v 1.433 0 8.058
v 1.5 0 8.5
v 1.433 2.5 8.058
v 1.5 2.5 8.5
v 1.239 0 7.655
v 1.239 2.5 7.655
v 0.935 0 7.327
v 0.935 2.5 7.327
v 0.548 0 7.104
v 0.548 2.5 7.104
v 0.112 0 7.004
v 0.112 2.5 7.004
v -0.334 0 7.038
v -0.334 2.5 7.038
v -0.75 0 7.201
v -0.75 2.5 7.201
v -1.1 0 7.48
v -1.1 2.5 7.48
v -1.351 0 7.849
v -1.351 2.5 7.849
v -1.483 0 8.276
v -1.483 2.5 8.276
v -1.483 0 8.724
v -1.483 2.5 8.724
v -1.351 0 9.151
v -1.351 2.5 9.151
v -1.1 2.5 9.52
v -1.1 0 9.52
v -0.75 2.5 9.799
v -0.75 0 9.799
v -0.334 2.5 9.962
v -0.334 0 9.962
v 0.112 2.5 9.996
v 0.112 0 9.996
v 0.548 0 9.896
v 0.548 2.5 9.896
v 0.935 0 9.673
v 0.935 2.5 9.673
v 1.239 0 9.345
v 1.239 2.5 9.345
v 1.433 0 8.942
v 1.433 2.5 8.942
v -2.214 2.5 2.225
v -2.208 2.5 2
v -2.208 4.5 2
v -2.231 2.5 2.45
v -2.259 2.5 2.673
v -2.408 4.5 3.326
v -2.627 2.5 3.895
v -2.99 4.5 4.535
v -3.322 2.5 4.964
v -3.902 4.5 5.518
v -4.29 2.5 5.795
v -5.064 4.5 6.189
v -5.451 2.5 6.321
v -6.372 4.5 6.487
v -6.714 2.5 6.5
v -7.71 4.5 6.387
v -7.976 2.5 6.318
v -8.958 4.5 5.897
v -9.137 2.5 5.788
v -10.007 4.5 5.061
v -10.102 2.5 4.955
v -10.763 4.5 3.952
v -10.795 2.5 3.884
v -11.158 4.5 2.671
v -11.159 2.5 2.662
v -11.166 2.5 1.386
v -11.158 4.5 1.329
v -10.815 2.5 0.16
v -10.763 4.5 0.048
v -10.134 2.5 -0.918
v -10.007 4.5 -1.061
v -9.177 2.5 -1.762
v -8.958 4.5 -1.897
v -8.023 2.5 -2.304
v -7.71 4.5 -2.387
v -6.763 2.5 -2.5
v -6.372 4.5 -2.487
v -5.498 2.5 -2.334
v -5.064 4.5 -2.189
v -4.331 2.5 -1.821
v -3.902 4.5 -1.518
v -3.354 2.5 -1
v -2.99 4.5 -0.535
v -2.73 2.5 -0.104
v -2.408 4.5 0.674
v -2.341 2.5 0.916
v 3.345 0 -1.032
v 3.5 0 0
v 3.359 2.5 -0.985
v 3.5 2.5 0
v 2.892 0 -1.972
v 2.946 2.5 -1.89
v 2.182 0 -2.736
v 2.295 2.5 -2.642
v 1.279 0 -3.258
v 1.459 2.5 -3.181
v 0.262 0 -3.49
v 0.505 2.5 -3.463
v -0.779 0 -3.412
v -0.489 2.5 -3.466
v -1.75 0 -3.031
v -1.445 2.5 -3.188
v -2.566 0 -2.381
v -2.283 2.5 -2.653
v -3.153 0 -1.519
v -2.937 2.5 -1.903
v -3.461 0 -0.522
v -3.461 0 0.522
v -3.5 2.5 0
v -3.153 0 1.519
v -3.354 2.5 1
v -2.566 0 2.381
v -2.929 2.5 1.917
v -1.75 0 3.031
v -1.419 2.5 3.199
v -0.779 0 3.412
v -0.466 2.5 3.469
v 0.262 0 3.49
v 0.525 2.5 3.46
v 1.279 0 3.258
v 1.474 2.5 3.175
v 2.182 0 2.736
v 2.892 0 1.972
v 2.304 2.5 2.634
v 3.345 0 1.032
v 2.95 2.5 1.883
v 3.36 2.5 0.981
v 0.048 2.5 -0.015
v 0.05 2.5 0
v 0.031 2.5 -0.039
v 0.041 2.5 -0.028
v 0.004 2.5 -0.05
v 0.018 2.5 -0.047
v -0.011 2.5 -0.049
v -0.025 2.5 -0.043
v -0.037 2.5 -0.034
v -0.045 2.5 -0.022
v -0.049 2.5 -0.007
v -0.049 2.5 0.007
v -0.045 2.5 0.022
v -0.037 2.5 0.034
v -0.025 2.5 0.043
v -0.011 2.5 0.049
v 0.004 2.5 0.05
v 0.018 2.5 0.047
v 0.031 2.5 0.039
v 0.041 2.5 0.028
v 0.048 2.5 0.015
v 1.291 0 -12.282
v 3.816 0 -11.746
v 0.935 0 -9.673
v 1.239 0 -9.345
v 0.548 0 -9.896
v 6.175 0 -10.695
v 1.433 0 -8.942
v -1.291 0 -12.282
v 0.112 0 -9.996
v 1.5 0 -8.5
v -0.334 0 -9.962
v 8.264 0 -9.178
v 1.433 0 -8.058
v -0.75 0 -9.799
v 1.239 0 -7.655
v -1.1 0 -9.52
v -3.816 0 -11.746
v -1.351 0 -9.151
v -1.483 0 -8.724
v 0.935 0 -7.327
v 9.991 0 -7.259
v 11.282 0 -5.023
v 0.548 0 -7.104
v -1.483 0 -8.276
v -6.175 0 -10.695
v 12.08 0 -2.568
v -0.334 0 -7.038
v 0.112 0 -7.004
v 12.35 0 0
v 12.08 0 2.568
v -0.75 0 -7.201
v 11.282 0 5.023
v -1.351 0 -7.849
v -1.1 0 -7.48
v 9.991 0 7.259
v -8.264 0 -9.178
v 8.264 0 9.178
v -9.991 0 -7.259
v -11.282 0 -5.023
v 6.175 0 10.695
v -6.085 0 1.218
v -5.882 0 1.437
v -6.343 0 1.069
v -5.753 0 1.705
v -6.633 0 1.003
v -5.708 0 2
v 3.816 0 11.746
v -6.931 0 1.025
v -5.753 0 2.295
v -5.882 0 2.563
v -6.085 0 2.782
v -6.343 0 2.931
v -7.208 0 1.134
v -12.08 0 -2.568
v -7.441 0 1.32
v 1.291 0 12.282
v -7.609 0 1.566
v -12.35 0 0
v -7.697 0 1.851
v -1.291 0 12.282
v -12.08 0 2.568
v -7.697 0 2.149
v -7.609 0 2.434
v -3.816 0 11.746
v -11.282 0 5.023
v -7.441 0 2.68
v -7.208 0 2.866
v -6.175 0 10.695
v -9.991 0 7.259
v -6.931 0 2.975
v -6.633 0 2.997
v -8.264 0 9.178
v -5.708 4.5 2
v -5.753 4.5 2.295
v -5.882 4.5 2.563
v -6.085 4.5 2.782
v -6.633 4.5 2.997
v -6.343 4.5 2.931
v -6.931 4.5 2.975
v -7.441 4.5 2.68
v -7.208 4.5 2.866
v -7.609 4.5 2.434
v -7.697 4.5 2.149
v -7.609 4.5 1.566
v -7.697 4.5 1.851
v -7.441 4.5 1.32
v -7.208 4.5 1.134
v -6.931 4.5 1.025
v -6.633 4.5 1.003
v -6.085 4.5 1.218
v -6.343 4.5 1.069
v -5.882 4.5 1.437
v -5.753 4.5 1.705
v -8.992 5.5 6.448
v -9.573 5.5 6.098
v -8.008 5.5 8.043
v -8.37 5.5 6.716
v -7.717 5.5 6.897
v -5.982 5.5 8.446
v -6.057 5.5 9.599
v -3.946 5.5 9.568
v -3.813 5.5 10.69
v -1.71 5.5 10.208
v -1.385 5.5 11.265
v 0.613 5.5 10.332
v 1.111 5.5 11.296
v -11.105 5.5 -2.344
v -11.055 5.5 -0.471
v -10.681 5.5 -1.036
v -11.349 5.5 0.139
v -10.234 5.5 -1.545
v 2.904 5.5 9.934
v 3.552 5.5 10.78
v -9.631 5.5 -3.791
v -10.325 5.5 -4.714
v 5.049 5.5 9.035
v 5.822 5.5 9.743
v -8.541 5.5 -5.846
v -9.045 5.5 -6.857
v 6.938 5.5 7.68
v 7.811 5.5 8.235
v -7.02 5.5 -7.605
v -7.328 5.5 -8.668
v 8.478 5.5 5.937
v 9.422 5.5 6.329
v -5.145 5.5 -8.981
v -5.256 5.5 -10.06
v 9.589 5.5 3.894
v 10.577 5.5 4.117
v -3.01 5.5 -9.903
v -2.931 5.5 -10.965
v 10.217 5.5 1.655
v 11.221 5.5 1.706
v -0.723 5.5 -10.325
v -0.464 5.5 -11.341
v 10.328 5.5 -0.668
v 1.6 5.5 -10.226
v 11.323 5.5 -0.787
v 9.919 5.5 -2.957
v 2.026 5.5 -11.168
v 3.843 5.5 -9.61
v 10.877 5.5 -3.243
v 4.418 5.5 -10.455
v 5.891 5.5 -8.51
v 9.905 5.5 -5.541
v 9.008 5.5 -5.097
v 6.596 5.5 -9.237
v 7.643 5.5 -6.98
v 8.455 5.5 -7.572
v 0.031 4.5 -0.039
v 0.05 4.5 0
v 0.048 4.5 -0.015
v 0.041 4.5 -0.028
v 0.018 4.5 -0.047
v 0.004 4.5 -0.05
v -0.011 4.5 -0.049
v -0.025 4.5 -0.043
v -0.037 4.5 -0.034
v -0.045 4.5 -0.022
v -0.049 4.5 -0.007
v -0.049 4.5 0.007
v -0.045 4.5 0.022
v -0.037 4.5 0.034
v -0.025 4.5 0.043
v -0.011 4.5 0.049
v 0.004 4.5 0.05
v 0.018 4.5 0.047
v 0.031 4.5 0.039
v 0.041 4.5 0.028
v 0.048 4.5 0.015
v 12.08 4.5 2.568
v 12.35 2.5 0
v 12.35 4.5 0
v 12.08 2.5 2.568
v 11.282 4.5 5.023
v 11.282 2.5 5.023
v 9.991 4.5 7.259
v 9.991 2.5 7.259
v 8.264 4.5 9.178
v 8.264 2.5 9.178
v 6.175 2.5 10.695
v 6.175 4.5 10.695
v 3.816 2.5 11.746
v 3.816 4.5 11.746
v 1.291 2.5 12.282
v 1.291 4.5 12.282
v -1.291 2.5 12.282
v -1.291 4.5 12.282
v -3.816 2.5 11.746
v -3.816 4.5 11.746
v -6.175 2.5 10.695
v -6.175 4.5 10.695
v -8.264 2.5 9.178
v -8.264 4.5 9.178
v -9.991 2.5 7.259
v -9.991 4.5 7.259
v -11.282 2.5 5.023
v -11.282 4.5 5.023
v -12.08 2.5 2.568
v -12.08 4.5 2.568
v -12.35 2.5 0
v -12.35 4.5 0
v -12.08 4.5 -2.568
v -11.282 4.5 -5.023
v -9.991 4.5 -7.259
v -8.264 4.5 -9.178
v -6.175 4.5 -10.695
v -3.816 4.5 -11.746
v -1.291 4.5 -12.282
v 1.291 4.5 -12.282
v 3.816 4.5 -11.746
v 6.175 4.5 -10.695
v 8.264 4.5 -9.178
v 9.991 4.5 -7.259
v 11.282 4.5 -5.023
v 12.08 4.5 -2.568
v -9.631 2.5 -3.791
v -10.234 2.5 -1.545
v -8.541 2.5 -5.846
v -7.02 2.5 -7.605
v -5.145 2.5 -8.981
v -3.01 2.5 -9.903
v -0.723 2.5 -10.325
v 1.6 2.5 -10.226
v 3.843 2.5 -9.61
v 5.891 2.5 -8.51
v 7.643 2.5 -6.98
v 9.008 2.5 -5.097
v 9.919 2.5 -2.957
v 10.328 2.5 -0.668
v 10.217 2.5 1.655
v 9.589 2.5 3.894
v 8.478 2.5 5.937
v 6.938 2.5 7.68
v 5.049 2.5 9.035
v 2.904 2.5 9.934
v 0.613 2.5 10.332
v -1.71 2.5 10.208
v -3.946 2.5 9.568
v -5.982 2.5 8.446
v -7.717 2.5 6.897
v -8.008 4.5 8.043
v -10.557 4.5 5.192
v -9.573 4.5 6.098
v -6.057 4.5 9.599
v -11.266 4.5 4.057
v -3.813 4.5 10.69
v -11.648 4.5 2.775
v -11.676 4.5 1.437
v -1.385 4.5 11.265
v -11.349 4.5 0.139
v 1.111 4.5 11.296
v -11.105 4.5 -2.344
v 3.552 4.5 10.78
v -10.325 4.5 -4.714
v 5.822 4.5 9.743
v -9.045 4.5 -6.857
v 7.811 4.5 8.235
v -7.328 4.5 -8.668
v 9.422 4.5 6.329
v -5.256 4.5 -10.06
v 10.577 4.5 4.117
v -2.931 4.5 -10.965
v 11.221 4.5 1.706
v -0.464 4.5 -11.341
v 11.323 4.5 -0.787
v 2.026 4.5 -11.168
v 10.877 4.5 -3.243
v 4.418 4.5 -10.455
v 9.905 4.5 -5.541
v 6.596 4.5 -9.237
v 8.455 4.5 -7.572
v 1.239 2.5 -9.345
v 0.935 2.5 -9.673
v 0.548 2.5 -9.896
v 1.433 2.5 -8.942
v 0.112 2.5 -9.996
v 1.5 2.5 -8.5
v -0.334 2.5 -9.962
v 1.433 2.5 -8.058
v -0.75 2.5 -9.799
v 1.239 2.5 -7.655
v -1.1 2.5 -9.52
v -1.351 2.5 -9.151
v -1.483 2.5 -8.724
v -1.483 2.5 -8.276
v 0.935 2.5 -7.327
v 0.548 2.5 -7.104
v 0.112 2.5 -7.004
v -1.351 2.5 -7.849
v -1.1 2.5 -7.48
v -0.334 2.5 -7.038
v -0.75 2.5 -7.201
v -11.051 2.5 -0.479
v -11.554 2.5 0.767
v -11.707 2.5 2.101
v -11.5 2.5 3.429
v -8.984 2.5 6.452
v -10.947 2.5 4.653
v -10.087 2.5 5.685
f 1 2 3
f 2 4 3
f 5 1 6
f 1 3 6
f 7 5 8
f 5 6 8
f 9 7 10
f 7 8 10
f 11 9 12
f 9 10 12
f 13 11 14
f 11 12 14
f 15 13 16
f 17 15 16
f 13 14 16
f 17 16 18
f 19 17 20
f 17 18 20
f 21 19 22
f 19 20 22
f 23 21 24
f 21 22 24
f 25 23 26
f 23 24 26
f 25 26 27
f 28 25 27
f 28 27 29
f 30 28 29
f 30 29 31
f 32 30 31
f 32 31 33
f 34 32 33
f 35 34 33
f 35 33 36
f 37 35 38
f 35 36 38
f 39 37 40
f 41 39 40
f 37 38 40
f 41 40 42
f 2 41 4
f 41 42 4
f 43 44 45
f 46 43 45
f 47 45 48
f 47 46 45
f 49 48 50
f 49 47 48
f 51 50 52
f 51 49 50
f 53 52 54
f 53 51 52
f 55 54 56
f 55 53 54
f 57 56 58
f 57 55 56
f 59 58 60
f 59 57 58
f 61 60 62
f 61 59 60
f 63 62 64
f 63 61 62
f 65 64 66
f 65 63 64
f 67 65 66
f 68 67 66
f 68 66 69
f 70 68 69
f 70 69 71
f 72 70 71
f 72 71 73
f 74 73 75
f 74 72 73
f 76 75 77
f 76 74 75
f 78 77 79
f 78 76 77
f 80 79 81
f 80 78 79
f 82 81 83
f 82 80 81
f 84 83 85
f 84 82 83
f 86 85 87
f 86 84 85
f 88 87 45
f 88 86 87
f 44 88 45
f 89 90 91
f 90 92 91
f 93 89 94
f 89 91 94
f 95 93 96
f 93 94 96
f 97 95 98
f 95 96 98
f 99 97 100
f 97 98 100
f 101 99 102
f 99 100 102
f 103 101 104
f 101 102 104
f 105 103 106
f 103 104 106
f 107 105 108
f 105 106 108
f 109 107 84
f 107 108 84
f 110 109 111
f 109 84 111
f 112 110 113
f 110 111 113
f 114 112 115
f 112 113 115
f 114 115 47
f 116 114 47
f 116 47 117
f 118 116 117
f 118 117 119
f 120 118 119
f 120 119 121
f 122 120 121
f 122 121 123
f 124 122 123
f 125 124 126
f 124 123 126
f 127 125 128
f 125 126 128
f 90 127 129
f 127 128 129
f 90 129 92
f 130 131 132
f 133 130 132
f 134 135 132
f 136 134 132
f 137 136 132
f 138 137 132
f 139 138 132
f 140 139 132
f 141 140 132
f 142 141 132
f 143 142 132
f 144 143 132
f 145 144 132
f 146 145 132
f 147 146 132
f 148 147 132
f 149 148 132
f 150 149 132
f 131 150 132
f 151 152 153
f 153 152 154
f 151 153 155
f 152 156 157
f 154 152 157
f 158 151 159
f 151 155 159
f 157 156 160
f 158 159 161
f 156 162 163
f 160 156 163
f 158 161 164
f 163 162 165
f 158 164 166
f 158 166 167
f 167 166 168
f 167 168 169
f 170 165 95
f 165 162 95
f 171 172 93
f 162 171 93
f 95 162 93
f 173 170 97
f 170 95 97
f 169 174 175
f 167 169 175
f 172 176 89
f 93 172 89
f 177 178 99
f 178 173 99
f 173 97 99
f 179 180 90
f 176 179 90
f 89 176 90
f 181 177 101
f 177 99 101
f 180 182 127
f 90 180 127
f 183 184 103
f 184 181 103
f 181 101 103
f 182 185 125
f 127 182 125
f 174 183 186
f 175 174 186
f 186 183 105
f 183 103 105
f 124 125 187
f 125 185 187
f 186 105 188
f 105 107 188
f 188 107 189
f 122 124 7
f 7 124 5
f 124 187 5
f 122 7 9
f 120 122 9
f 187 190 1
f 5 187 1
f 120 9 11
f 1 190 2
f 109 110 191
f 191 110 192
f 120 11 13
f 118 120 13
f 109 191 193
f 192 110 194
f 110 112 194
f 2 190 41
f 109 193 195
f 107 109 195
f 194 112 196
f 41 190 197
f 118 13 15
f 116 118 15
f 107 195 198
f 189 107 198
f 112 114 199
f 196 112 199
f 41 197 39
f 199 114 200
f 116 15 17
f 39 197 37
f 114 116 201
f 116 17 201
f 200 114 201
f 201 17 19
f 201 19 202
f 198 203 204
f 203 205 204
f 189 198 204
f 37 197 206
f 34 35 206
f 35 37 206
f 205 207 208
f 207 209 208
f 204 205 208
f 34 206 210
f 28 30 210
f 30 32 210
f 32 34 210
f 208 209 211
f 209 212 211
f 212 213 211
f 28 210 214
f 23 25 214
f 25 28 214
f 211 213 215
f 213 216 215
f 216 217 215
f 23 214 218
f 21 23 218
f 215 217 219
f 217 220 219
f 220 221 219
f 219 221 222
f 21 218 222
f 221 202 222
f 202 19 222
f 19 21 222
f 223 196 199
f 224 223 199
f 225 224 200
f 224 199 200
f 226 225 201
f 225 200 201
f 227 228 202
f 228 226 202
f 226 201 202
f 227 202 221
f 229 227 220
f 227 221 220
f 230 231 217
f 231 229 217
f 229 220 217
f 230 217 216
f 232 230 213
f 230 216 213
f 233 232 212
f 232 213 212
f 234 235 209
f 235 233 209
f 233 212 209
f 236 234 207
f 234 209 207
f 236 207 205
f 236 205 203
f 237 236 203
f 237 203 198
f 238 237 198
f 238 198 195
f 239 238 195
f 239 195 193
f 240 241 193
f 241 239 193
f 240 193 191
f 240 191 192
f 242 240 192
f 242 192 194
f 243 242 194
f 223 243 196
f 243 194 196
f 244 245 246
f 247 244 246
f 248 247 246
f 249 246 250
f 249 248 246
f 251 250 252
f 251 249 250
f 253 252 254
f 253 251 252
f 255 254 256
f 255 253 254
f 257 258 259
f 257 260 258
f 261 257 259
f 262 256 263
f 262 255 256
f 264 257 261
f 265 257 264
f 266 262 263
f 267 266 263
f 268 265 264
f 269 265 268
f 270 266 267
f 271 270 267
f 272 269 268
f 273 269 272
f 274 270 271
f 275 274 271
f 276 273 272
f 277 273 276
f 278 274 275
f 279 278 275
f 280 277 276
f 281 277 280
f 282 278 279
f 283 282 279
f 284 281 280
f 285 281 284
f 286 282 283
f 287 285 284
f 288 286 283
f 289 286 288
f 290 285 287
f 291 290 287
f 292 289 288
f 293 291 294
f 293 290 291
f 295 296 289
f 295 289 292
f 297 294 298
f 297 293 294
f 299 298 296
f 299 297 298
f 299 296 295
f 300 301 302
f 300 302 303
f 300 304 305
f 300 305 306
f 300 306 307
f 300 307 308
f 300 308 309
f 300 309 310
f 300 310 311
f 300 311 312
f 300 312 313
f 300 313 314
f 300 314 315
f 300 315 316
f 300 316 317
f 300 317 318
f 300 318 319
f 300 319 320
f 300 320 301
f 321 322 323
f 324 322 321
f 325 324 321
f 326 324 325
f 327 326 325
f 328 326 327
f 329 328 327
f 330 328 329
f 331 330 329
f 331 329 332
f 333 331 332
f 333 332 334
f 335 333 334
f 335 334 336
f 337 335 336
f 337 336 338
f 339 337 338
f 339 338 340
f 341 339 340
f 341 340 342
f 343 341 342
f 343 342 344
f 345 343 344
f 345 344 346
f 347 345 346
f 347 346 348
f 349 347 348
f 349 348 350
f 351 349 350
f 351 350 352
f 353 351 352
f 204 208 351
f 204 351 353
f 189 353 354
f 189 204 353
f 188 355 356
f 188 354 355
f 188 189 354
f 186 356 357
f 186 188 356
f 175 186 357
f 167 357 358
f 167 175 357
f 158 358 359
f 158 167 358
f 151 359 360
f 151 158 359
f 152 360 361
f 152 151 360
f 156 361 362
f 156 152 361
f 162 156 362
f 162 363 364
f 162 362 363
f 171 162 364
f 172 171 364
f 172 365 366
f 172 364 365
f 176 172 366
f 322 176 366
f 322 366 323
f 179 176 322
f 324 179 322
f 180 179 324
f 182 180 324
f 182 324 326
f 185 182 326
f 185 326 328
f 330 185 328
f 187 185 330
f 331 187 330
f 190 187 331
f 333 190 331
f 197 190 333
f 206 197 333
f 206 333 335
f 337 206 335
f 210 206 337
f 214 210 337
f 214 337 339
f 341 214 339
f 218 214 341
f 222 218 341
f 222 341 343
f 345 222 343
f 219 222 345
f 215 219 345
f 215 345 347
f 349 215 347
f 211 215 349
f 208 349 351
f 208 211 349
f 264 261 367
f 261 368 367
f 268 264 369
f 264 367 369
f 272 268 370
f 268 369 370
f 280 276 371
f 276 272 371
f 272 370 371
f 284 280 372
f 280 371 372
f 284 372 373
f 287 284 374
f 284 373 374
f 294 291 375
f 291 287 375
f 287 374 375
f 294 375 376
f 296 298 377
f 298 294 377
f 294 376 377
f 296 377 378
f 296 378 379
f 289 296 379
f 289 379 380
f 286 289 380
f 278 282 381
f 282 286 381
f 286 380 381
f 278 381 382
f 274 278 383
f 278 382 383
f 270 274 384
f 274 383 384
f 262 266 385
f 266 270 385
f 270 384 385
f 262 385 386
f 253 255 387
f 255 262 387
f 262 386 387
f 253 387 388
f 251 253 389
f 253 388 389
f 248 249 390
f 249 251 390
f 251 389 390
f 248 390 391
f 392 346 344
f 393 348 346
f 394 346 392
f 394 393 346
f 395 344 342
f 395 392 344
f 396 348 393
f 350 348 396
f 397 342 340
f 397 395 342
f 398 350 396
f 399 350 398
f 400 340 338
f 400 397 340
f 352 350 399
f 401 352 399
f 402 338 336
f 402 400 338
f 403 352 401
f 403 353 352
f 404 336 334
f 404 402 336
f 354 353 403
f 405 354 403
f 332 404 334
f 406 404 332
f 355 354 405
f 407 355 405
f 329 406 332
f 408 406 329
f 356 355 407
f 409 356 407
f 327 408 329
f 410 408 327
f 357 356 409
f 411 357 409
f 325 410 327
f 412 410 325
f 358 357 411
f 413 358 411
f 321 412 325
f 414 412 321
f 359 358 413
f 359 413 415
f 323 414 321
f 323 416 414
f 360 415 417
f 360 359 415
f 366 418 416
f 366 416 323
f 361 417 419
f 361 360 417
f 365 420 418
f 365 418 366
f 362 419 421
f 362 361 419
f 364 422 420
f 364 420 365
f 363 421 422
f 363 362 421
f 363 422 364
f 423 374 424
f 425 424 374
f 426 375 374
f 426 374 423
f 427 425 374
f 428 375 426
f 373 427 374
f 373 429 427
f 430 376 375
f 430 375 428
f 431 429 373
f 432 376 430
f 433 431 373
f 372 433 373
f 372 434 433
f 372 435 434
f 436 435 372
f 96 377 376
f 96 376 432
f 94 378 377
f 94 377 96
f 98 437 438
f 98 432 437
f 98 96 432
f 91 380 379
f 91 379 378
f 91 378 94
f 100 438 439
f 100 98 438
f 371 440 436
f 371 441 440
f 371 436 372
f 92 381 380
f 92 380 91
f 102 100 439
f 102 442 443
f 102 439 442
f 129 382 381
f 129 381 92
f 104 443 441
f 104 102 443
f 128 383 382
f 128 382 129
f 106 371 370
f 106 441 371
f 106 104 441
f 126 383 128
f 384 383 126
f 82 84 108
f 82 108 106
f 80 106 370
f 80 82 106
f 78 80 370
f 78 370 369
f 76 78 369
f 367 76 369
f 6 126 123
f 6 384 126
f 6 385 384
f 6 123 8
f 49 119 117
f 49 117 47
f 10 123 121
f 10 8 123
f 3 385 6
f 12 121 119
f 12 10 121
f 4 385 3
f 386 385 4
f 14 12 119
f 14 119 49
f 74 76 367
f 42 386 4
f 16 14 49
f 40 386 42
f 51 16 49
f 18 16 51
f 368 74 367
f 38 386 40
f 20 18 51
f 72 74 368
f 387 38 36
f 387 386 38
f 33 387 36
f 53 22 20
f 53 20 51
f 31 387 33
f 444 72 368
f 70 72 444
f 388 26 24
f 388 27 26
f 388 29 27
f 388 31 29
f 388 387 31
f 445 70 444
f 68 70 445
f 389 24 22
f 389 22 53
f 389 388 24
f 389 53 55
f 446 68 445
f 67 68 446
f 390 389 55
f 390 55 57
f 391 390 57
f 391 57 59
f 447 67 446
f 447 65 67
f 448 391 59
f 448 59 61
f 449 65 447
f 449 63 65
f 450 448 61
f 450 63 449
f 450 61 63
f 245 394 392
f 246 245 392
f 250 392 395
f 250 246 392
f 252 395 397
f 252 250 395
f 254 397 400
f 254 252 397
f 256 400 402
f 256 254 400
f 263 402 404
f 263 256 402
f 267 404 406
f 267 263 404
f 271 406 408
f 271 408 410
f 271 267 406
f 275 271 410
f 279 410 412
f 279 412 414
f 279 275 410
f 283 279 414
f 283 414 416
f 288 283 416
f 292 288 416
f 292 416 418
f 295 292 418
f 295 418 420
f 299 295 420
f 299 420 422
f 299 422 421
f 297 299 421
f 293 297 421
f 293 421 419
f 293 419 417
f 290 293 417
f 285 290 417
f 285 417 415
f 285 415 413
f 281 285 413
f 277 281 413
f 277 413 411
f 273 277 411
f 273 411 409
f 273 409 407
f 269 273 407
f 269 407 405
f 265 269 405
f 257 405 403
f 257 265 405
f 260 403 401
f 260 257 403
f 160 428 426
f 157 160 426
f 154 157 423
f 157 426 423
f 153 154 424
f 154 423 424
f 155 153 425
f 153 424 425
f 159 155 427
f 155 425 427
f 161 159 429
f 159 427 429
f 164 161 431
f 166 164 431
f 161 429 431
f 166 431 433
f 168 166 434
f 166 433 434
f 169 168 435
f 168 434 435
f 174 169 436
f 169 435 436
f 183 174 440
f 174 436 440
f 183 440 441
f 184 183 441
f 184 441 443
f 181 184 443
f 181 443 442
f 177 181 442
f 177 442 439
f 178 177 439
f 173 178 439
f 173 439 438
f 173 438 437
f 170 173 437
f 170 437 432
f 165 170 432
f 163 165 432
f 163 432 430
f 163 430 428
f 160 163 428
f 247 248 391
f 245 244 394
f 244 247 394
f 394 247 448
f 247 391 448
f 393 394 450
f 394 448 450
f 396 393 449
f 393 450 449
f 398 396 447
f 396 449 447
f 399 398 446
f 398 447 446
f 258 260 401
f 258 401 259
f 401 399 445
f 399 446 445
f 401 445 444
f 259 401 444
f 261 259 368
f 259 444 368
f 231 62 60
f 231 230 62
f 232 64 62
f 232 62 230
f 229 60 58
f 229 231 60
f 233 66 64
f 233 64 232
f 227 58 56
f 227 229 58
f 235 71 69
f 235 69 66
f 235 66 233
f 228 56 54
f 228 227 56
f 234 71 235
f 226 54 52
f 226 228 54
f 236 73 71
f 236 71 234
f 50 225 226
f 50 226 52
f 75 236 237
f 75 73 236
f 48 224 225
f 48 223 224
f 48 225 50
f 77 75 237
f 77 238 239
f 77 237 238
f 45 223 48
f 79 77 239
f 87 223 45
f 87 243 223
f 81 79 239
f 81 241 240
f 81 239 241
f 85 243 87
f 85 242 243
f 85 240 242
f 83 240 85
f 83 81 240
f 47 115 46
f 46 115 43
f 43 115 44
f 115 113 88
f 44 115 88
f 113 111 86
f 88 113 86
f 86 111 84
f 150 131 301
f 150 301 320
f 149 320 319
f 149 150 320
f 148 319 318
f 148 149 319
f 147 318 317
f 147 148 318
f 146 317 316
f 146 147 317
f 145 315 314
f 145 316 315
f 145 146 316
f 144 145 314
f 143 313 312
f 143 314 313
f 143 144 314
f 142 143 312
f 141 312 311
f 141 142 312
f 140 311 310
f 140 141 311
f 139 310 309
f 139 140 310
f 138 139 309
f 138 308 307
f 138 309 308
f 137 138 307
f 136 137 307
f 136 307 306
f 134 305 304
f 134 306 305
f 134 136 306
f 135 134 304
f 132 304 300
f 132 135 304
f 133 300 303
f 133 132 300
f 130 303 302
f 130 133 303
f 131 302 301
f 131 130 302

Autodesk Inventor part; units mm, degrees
ref_plane "YZ Plane" through (0, 0, 0) normal (1, 0, 0) x (0, 1, 0)
ref_plane "XZ Plane" through (0, 0, 0) normal (0, 1, 0) x (-1, 0, 0)
ref_plane "XY Plane" through (0, 0, 0) normal (0, 0, 1) x (1, 0, 0)
sketch "Szkic1" plane through (0, 0, 0) normal (0, 1, 0) x (-1, 0, 0)
  circle A0 centre (0, 0) radius 12.35
  dimension "d0" = 24.7
extrude "Wyciągnięcie proste1" add sketch "Szkic1" along normal blind 2.5
sketch "Szkic2" plane through (0, 2.5, 0) normal (0, 1, 0) x (1, 0, 0)
  circle A0 centre (0, 0) radius 3.5
  dimension "d3" = 7
extrude "Wyciągnięcie proste2" cut sketch "Szkic2" against normal blind 2.5
sketch "Szkic3" plane through (0, 2.5, 0) normal (0, 1, 0) x (1, 0, 0)
  circle A0 centre (0, -8.5) radius 1.5
  circle A1 centre (0, 8.5) radius 1.5
  point P0 (0, 0)
  dimension "d6" = 3
  dimension "d7" = 3
  dimension "d8" = 17
  dimension "d9" = 8.5
extrude "Wyciągnięcie proste3" cut sketch "Szkic3" against normal blind 2.5
sketch "Szkic4" plane through (0, 2.5, 0) normal (0, 1, 0) x (1, 0, 0)
  circle A0 centre (-6.7082, -2) radius 1
  circle A1 centre (-5.7446, 4) radius 1 construction
  point P0 (0, 0)
  dimension "d12" = 2
  dimension "d13" = 7
  dimension "d31" = 2
  dimension "d32" = 7
  dimension "d33" = 6
  dimension "d34" = 2
extrude "Wyciągnięcie proste4" cut sketch "Szkic4" against normal blind 2.5
sketch "Szkic6" plane through (0, 2.5, 0) normal (0, 1, 0) x (1, 0, 0)
  circle A0 centre (0, 0) radius 12.35
  circle A1 centre (0, 0) radius 10.35
  circle A2 centre (0, 0) radius 12.35 projected
  dimension "d19" = 2
  dimension "d20" = 0
extrude "Wyciągnięcie proste6" add sketch "Szkic6" along normal blind 3
sketch "Szkic7" plane through (0, 5.5, 0) normal (0, 1, 0) x (1, 0, 0)
  circle A0 centre (0, 0) radius 12.35
  circle A1 centre (0, 0) radius 11.35
  circle A2 centre (0, 0) radius 12.35 projected
  dimension "d23" = 1
  dimension "d24" = 0
extrude "Wyciągnięcie proste7" cut sketch "Szkic7" against normal blind 1
sketch "Szkic5" plane through (0, 2.5, 0) normal (0, 1, 0) x (1, 0, 0)
  circle A0 centre (-6.7082, -2) radius 5
  circle A1 centre (-6.7082, -2) radius 1 projected
  point P0 (0, 0)
  point P1 (-7, 0)
  dimension "d27" = 10
extrude "Wyciągnięcie proste5" cut sketch "Szkic5" along normal blind 3 contours A0 | A1
sketch "Szkic8" plane through (0, 2.5, 0) normal (0, 1, 0) x (1, 0, 0)
  circle A0 centre (-6.7082, -2) radius 1 projected
  circle A1 centre (-6.7082, -2) radius 4.5
  point P0 (0, 0)
  dimension "d28" = 9
extrude "Wyciągnięcie proste8" add sketch "Szkic8" along normal blind 2
sketch "Szkic9" plane through (0, 2.5, 0) normal (0, 1, 0) x (1, 0, 0)
  circle A0 centre (0, 0) radius 0.05
  dimension "d35" = 0.1
extrude "Wyciągnięcie proste9" add sketch "Szkic9" along normal blind 2
properties part number "GEAR_BOTTOM" material "Ołów"
